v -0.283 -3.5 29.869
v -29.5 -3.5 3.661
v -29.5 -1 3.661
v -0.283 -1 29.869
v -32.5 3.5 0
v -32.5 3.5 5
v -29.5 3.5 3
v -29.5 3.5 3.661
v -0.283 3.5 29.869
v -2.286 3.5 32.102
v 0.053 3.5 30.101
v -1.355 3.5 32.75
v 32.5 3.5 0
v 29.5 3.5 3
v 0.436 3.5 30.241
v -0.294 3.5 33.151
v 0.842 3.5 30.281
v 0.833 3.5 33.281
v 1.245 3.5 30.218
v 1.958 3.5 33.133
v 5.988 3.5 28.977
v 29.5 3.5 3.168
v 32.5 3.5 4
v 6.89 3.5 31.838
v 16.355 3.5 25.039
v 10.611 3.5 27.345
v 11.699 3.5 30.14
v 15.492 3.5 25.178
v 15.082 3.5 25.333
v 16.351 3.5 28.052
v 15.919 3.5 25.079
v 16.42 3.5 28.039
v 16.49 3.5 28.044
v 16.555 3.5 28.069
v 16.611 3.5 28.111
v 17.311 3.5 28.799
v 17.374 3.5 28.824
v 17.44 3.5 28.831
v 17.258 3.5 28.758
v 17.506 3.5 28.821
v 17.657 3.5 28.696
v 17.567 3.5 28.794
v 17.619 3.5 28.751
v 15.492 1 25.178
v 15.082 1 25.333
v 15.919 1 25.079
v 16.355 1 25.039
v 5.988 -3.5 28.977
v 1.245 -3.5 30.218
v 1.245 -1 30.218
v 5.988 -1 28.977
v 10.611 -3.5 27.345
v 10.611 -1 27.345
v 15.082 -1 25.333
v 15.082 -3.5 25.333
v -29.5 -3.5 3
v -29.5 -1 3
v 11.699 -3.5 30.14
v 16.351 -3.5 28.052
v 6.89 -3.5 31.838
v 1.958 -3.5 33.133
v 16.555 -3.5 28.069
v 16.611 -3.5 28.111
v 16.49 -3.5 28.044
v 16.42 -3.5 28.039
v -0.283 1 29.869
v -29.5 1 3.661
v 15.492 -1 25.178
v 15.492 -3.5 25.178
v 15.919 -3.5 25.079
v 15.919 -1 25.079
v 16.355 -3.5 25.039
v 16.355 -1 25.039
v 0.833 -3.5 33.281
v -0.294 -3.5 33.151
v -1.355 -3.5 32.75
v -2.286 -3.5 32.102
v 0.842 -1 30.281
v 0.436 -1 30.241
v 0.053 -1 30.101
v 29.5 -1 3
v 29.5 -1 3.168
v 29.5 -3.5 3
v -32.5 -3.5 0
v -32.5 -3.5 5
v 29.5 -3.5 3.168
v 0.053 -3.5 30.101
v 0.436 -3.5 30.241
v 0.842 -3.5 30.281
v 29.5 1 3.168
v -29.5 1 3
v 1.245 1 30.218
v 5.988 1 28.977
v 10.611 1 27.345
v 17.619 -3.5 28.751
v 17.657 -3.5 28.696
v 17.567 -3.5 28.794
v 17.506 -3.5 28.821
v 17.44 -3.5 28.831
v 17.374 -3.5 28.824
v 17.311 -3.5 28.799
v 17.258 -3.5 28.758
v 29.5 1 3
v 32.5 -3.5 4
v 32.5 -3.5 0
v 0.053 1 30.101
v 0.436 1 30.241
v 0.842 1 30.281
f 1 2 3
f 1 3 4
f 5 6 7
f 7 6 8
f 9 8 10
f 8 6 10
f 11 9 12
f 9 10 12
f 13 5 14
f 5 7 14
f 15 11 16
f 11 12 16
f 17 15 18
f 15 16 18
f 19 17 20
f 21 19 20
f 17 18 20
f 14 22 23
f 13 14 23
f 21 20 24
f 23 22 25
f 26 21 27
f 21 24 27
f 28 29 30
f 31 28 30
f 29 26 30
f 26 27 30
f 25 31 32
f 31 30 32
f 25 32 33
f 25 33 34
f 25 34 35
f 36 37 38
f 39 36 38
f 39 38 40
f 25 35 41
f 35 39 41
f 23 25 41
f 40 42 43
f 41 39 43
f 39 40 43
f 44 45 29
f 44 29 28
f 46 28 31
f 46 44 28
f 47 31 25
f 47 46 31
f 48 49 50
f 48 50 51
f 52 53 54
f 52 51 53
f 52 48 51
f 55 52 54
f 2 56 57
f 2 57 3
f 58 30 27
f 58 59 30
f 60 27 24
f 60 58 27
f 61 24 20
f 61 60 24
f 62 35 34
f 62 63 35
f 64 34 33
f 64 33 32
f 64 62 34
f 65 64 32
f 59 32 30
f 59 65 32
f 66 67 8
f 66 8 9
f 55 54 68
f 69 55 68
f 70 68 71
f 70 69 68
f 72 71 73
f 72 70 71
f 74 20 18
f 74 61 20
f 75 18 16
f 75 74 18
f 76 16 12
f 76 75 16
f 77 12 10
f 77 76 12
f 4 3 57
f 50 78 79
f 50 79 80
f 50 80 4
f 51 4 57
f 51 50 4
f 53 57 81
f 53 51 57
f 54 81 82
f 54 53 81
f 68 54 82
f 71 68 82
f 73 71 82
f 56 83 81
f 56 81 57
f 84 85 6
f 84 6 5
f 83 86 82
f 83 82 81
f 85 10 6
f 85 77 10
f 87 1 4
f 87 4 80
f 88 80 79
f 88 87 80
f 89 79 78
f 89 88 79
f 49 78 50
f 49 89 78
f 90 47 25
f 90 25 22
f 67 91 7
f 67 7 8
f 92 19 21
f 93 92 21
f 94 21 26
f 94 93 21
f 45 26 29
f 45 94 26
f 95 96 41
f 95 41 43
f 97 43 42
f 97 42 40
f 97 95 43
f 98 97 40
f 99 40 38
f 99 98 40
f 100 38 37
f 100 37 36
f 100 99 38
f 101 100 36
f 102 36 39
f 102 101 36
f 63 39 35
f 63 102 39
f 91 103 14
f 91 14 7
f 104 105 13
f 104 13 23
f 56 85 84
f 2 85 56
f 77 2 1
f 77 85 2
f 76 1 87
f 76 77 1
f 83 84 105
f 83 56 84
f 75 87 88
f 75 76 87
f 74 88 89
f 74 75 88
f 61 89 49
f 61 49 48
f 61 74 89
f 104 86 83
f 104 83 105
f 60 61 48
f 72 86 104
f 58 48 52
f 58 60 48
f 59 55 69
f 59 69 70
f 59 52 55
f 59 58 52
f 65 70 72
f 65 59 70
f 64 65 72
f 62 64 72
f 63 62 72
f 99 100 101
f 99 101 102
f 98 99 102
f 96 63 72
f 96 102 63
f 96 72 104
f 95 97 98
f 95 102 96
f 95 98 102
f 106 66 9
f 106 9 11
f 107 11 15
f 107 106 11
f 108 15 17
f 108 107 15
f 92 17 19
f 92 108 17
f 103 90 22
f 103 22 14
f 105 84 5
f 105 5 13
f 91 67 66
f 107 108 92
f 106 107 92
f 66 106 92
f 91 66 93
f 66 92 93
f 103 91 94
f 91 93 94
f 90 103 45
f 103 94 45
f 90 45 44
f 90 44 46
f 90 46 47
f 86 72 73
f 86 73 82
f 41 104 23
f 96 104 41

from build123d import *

# Parameters (mm, degrees)
F2_DEPTH = 3.5
F3_DEPTH = 1


with BuildPart() as f2:
    # F1 (on face) → F2 (new body, symmetric)
    with BuildSketch(Plane.XZ):
        with BuildLine():
            Line((-2.286308, 32.102048), (-32.5, 5))
            Line((-32.5, 5), (-32.5, 0))
            Line((-32.5, 0), (32.5, 0))
            Line((32.5, 0), (32.5, 4))
            Line((32.5, 4), (17.657075, 28.696322))
            ThreePointArc((17.657075, 28.696322), (17.473375, 28.828507), (17.258243, 28.758243))
            Line((17.258243, 28.758243), (16.611408, 28.111408))
            ThreePointArc((16.611408, 28.111408), (16.489934, 28.044379), (16.351427, 28.052438))
            ThreePointArc((16.351427, 28.052438), (9.312089, 31.038714), (1.957773, 33.132551))
            ThreePointArc((1.957773, 33.132551), (-0.293903, 33.151198), (-2.286308, 32.102048))
        make_face()
        with BuildLine():
            Line((16.35495, 25.039163), (29.500001, 3.16784))
            Line((29.500001, 3.16784), (29.500001, 2.999999))
            Line((29.500001, 2.999999), (-29.500001, 2.999999))
            Line((-29.500001, 2.999999), (-29.500001, 3.66094))
            Line((-29.500001, 3.66094), (-0.283103, 29.868852))
            ThreePointArc((-0.283103, 29.868852), (0.435633, 30.241011), (1.244666, 30.217565))
            ThreePointArc((1.244666, 30.217565), (8.316297, 28.208802), (15.081898, 25.333087))
            ThreePointArc((15.081898, 25.333087), (15.703501, 25.121492), (16.35495, 25.039163))
        make_face(mode=Mode.SUBTRACT)
    extrude(amount=F2_DEPTH, both=True)

    # F1 (on face) → F3 (join, symmetric)
    with BuildSketch(Plane.XZ):
        with BuildLine():
            Line((29.500001, 2.999999), (29.500001, 3.16784))
            Line((29.500001, 3.16784), (16.35495, 25.039163))
            ThreePointArc((16.35495, 25.039163), (15.703501, 25.121492), (15.081898, 25.333087))
            ThreePointArc((15.081898, 25.333087), (8.316297, 28.208802), (1.244666, 30.217565))
            ThreePointArc((1.244666, 30.217565), (0.435633, 30.241011), (-0.283103, 29.868852))
            Line((-0.283103, 29.868852), (-29.500001, 3.66094))
            Line((-29.500001, 3.66094), (-29.500001, 2.999999))
            Line((-29.500001, 2.999999), (29.500001, 2.999999))
        make_face()
    extrude(amount=F3_DEPTH, both=True)


solid = f2.part
